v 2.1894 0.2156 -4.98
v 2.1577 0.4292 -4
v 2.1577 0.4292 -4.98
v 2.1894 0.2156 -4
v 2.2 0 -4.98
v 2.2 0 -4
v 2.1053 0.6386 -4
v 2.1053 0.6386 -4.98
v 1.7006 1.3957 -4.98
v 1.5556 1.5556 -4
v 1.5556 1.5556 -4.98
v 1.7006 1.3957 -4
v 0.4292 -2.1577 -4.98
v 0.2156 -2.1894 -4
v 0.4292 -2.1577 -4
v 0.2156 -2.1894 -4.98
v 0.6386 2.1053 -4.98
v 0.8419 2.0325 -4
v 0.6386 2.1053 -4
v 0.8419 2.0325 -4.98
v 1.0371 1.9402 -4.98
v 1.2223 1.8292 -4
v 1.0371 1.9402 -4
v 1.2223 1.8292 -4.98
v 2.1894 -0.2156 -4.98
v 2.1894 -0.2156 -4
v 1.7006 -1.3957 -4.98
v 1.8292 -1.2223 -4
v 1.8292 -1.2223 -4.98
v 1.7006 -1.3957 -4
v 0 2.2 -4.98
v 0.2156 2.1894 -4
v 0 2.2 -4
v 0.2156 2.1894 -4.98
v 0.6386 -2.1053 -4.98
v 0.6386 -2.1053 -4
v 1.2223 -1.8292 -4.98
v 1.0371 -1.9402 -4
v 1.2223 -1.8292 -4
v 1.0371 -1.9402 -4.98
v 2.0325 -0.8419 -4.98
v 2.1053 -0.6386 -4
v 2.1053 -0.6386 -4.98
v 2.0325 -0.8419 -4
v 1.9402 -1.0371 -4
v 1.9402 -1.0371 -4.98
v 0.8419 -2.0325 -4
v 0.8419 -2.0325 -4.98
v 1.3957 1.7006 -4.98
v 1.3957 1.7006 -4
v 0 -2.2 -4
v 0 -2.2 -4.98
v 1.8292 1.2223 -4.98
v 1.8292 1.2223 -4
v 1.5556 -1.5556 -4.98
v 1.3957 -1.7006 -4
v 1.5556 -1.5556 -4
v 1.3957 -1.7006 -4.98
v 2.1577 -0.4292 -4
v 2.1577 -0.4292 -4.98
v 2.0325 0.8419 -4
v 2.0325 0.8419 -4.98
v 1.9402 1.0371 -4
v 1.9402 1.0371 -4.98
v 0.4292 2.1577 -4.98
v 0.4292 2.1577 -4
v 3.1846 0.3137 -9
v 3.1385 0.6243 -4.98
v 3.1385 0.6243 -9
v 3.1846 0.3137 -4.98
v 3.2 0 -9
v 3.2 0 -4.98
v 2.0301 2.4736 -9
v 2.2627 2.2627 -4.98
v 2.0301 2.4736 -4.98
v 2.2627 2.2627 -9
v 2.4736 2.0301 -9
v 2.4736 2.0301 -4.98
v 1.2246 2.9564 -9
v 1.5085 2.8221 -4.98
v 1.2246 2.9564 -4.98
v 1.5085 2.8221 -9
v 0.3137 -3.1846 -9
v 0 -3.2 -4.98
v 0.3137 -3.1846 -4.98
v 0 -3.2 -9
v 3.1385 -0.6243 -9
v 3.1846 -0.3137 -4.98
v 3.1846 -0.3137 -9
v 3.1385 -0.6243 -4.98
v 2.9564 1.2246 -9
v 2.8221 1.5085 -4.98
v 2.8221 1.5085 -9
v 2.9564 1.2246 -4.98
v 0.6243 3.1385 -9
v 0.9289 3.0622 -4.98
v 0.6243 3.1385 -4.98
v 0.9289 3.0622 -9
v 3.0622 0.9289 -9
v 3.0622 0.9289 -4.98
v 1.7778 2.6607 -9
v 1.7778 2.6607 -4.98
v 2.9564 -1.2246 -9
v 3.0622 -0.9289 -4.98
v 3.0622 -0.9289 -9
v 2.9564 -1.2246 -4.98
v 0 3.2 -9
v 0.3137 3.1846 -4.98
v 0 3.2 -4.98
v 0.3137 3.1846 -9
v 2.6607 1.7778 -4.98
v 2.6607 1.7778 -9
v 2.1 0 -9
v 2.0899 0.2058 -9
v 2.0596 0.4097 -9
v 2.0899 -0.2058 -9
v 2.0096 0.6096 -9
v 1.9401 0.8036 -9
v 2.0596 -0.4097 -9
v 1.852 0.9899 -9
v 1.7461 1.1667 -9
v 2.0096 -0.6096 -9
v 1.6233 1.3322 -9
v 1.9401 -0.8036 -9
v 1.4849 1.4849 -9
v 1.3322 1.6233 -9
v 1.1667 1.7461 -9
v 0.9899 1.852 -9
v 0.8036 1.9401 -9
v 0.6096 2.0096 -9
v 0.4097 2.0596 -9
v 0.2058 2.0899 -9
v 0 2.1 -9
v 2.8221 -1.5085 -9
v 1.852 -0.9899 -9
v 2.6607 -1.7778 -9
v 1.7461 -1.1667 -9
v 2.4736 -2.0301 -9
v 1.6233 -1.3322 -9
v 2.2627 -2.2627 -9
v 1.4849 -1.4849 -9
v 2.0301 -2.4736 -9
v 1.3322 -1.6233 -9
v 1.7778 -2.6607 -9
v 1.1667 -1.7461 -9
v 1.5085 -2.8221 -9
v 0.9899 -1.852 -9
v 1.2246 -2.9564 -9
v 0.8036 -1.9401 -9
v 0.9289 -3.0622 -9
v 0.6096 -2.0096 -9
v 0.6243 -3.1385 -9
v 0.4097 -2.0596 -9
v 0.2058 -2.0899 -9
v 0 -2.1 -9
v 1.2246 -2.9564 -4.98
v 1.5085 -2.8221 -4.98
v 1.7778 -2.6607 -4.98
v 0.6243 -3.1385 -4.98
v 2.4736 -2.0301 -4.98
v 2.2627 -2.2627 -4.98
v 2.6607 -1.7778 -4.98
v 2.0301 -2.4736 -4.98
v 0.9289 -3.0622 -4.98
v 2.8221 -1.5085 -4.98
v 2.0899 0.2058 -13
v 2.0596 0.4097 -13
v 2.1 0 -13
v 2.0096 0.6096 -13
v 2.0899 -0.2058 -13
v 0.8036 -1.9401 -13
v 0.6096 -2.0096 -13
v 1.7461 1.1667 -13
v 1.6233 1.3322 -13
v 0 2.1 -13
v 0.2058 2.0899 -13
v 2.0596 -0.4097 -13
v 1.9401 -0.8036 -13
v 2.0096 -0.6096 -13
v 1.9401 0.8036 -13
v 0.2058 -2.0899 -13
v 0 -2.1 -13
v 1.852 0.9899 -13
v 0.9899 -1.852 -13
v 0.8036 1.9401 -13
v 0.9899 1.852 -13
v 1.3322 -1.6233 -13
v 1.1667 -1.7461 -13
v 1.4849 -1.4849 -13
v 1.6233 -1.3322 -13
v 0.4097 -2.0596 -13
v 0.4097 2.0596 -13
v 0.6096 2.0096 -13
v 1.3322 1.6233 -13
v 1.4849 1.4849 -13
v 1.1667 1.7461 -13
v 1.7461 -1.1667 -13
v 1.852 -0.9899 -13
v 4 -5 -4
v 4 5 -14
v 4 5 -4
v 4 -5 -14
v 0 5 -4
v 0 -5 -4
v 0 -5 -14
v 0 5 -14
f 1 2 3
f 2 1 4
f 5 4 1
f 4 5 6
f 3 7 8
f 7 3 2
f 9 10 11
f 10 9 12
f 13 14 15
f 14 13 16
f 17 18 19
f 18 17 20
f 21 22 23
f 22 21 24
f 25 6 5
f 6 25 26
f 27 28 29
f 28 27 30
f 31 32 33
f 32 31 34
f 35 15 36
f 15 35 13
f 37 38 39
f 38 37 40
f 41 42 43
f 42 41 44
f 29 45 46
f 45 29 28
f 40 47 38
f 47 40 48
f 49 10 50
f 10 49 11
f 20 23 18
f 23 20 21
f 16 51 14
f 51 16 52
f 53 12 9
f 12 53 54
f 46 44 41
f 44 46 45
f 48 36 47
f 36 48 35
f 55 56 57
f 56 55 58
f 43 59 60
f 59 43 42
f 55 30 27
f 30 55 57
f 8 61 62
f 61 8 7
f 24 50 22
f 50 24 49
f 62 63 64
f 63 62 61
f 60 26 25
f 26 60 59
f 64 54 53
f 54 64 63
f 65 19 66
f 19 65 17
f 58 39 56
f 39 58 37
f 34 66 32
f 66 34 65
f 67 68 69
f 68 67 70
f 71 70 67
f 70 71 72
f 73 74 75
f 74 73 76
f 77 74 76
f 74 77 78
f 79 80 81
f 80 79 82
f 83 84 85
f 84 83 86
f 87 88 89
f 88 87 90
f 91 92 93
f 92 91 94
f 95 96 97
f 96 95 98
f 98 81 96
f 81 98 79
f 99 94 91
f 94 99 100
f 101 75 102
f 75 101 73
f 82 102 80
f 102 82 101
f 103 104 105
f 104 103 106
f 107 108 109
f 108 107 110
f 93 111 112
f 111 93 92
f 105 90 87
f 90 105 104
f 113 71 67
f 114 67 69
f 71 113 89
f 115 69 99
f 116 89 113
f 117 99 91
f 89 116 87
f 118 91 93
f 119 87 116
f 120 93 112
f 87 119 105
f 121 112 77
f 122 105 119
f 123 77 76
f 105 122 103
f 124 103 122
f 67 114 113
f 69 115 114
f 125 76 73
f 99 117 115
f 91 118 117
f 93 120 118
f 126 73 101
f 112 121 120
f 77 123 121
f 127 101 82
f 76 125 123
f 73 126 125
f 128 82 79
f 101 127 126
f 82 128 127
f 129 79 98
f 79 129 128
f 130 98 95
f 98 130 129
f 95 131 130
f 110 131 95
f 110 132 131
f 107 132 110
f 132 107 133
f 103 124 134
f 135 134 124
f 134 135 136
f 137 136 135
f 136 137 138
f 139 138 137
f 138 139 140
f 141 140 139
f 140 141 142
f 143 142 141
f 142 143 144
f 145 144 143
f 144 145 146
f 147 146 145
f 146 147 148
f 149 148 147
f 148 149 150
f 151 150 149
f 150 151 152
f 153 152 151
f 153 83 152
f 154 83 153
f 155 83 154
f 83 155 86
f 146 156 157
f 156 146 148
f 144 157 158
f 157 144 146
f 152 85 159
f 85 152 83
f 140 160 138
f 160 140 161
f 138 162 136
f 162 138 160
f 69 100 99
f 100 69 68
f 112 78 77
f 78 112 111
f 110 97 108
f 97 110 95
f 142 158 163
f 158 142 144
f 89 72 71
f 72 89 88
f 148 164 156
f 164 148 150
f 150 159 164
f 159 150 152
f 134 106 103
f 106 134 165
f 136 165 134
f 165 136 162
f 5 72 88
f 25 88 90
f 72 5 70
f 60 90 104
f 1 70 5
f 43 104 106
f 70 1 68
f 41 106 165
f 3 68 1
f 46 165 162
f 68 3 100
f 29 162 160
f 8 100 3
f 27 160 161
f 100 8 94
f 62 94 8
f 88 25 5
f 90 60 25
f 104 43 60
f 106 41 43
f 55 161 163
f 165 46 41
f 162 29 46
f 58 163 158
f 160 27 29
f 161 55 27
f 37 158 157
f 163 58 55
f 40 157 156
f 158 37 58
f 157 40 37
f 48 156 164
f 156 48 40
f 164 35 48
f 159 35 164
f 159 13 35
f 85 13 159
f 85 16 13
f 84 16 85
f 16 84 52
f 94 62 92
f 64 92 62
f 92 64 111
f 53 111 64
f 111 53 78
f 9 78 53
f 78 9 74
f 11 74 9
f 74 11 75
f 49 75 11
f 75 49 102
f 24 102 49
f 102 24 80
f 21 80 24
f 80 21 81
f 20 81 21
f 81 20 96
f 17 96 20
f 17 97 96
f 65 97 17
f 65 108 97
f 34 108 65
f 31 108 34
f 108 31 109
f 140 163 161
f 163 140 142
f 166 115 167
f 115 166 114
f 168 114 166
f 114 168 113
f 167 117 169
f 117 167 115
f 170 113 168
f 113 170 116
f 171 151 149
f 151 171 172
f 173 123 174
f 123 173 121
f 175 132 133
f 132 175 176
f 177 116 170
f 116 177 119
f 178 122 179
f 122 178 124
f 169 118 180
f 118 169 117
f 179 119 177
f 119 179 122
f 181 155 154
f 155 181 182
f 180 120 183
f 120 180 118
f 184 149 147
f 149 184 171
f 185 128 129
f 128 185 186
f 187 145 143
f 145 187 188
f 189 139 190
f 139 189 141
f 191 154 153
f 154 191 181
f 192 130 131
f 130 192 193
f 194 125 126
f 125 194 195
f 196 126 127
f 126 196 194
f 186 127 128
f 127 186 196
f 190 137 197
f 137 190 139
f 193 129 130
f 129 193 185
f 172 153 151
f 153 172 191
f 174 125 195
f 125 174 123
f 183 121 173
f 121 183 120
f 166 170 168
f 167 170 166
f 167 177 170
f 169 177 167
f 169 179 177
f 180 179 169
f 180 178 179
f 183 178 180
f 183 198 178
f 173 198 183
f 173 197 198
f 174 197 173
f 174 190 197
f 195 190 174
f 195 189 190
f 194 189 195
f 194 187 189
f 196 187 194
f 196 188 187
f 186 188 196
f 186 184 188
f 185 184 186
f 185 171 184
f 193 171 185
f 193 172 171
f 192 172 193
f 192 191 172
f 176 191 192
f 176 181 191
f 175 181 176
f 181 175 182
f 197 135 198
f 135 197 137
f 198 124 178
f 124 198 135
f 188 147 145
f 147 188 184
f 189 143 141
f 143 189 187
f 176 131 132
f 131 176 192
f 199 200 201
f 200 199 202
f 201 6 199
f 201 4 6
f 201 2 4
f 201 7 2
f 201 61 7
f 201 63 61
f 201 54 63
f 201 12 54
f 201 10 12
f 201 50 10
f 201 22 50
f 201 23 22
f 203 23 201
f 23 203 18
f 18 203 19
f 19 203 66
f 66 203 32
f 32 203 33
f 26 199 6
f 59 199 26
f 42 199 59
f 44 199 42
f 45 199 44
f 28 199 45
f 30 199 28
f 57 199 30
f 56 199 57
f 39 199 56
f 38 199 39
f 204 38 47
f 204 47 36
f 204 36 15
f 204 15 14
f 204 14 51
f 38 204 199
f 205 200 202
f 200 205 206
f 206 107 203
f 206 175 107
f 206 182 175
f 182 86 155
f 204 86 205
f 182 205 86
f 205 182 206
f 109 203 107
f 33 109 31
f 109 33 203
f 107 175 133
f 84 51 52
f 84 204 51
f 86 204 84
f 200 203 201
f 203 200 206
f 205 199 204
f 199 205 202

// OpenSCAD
btn6r_pind=1.1; //0.8 
btn6r_pigap=5;//
btn6r_topth=1.5;
btn6r_twth=1.8;
btn6r_sockh=5;
btn6r_zpind=3.8; //3.5 org
btn6r_expind=1.8; //1.5org
btn6r_exr=7.4/2;
btn6r_od=12.4;//12
btn6r_id=9.5; //10
btn6r_edge=0.7;


    
    mboxh=45+10;
    mboxw=45;
    mboxwth=10;
    
tbd=4+0.2;
pbd=4-0.2;
tbw1=6.45;
tbw2=8.2;
tbg=3.8-0.2;
tbh=6.65;
zsni=0.05;
xsni=0.02;
ysni=xsni;
sockh=10;
bd=4;
sockxs=10;
sockys=10;

slotofs=36.5;
slotw=18;
sloth=4;


bpth=3; //baseplate thickness

*bplate();

//translate([0,0,20]) bpen();

*translate([0,0,20]){
    difference(){
        bplate();
        translate([-18.5,8,bpth/2-zsni/2]) cube([sockxs,sockys,bpth+zsni*2],center=true);
        translate([-18.5,-8,bpth/2-zsni/2]) cube([sockxs,sockys,bpth+zsni*2],center=true);
        translate([mboxh/2-slotofs,0,1]) cube([sloth,slotw,bd+1],center=true);
    }
}
//translate([-18.5,8,20]) bclosure();
//*translate([-18.5,-8,20]) bclosure();
//translate([-18.5,8,20]) btn6r_closure();


module btn6r_closure(){
      difference(){
           iw=sockxs-btn6r_twth*2;
           ih=sockys-btn6r_twth*2;
           translate([-sockxs/2,-sockys/2,0]) cube([sockxs,sockys,btn6r_sockh]);
          //back cutout
           translate([-iw/2,-ih/2,-btn6r_topth]) cube([iw,ih,btn6r_sockh]);
          //solderpins
           translate([-btn6r_pigap/2,-btn6r_pigap/2,sockh/2+zsni/2]) cube([btn6r_pind,btn6r_pind,btn6r_sockh+zsni*2],center=true);
          translate([-btn6r_pigap/2,+btn6r_pigap/2,sockh/2+zsni/2]) cube([btn6r_pind,btn6r_pind,btn6r_sockh+zsni*2],center=true);
           translate([+btn6r_pigap/2,+btn6r_pigap/2,sockh/2+zsni/2]) cube([btn6r_pind,btn6r_pind,btn6r_sockh+zsni*2],center=true);
           translate([+btn6r_pigap/2,-btn6r_pigap/2,sockh/2+zsni/2]) cube([btn6r_pind,btn6r_pind,btn6r_sockh+zsni*2],center=true);
          //plastic pins
           cylinder(d=btn6r_zpind,h=btn6r_sockh+zsni*2,$fn=64);
           translate([-btn6r_exr,0,-zsni+btn6r_sockh-btn6r_topth]) 
                cylinder(d=btn6r_expind,h=btn6r_topth+zsni*2,$fn=64);
          translate([btn6r_exr,0,-zsni+btn6r_sockh-btn6r_topth]) 
                cylinder(d=btn6r_expind,h=btn6r_topth+zsni*2,$fn=64);
           translate([0,0,-zsni+btn6r_sockh-btn6r_topth]) 
              ring(btn6r_id,btn6r_od,btn6r_topth+zsni*2);
           translate([-iw/2,btn6r_id/2-btn6r_edge-ysni,+btn6r_sockh-btn6r_topth-zsni]) 
              cube([iw,btn6r_edge+ysni*2,btn6r_topth+0.1]);
                
       }
}

module ring(id,od,h){
    difference(){
        cylinder(d=od,h=h,$fn=64);
        cylinder(d=id,h=h+0.01,$fn=128);
    }
}



module bplate(){

  
    tph=50;
    pcbz=-33;
    translate([0,0,bpth/2]) cube([mboxh,mboxw,bpth],center=true);
}

module bpen(){
   buozs=5;
   buzs=1;
   buxs=sockxs+2;
   buys=sockys+2;   
   pexh=1.2;
   ph=bd+pexh;
   bugap=0.6;
   union(){
        translate([0,0,ph*2+buzs/2]) cube([buxs,buys,buzs],center=true);        
        translate([0,0,ph*2-buozs/2]){
            difference(){
                cube([buxs,buys,buozs],center=true);
                translate([0,0,-0.01])
                   cube([sockxs+bugap,sockys+bugap,buozs],center=true);
            }
             
        }
        
   }
   translate([0,0,ph-0.5]) cylinder(d=pbd, h=ph+0.5,$fn=64);
   
   
}

module bclosure(){

       difference(){
           translate([-sockxs/2,-sockys/2,0]) cube([sockxs,sockys,sockh]);
           translate([0,0,0]) bsockcutout();           
       }
       
}

module bsockcutout(){
    pd=sockh-bd;
    
        difference(){
           cutw=(tbw2-tbw1)/2;
           translate([0,0,pd/2-zsni]) cube([tbw2,tbh,pd],center=true);
           translate([-tbw1/2-cutw/2-xsni*2,0,pd/2-zsni]) cube([cutw,tbg,pd+zsni*4],center=true);
           translate([tbw1/2+cutw/2+xsni*2,0,pd/2-zsni]) cube([cutw,tbg,pd+zsni*4],center=true);
        }
        
      translate([0,0,-zsni]) cylinder(d=tbd,h=sockh+zsni*2,$fn=64);
    
}


module makepole(){
   union(){
       for(i=[0:3]) {
              translate([0,0,-polezs[i]]) cylinder(d=poledias[i],h=poleheights[i],$fn=64);
       }
       translate([0,0,-polezs[1]]) cylinder(d2=poledias[1],d1=poledias[2],h=0.5,$fn=64);   
   }
}

module makepolecut(){
    union(){
        for(i=[0:3]) {
             translate([0,0,-polehzs[i]]) cylinder(d=polediasfc[i]+0.4,h=poleheightsfc[i]+0.02,$fn=64);                   
        }
   }
}

module makehousing(){
  //halfs for demo housing
  ehousel=housel/2;
  difference(){
    translate([0,-housed/2,-househ]) cube([ehousel,housed,househ]);
   translate([0,0,poleheights[0]+2]) makepolecut();
  }
}



housel=8;
househ=10;
housed=10;
housetoprth=2; //thickness of lid retenation plane

poleheights=[3,3,2,4];
poleheightsfc=[3,3,4,4]; //heights for plunger coutout
polezs=[poleheights[0],
        poleheights[0]+poleheights[1],
        poleheights[0]+poleheights[1]+poleheights[2],
        poleheights[0]+poleheights[1]+poleheights[2]+poleheights[3]
        ];
polehzs=[poleheightsfc[0],
        poleheightsfc[0]+poleheightsfc[1],
        poleheightsfc[0]+poleheightsfc[1]+poleheightsfc[2],
        poleheightsfc[0]+poleheightsfc[1]+poleheightsfc[2]+poleheightsfc[3]
        ];
poledias=[6,4,6,3];
polediasfc=[6,4,6,3.8];

*color("red") makepole();
#translate([0,0,-(polezs[1]-housetoprth)])  makehousing();
